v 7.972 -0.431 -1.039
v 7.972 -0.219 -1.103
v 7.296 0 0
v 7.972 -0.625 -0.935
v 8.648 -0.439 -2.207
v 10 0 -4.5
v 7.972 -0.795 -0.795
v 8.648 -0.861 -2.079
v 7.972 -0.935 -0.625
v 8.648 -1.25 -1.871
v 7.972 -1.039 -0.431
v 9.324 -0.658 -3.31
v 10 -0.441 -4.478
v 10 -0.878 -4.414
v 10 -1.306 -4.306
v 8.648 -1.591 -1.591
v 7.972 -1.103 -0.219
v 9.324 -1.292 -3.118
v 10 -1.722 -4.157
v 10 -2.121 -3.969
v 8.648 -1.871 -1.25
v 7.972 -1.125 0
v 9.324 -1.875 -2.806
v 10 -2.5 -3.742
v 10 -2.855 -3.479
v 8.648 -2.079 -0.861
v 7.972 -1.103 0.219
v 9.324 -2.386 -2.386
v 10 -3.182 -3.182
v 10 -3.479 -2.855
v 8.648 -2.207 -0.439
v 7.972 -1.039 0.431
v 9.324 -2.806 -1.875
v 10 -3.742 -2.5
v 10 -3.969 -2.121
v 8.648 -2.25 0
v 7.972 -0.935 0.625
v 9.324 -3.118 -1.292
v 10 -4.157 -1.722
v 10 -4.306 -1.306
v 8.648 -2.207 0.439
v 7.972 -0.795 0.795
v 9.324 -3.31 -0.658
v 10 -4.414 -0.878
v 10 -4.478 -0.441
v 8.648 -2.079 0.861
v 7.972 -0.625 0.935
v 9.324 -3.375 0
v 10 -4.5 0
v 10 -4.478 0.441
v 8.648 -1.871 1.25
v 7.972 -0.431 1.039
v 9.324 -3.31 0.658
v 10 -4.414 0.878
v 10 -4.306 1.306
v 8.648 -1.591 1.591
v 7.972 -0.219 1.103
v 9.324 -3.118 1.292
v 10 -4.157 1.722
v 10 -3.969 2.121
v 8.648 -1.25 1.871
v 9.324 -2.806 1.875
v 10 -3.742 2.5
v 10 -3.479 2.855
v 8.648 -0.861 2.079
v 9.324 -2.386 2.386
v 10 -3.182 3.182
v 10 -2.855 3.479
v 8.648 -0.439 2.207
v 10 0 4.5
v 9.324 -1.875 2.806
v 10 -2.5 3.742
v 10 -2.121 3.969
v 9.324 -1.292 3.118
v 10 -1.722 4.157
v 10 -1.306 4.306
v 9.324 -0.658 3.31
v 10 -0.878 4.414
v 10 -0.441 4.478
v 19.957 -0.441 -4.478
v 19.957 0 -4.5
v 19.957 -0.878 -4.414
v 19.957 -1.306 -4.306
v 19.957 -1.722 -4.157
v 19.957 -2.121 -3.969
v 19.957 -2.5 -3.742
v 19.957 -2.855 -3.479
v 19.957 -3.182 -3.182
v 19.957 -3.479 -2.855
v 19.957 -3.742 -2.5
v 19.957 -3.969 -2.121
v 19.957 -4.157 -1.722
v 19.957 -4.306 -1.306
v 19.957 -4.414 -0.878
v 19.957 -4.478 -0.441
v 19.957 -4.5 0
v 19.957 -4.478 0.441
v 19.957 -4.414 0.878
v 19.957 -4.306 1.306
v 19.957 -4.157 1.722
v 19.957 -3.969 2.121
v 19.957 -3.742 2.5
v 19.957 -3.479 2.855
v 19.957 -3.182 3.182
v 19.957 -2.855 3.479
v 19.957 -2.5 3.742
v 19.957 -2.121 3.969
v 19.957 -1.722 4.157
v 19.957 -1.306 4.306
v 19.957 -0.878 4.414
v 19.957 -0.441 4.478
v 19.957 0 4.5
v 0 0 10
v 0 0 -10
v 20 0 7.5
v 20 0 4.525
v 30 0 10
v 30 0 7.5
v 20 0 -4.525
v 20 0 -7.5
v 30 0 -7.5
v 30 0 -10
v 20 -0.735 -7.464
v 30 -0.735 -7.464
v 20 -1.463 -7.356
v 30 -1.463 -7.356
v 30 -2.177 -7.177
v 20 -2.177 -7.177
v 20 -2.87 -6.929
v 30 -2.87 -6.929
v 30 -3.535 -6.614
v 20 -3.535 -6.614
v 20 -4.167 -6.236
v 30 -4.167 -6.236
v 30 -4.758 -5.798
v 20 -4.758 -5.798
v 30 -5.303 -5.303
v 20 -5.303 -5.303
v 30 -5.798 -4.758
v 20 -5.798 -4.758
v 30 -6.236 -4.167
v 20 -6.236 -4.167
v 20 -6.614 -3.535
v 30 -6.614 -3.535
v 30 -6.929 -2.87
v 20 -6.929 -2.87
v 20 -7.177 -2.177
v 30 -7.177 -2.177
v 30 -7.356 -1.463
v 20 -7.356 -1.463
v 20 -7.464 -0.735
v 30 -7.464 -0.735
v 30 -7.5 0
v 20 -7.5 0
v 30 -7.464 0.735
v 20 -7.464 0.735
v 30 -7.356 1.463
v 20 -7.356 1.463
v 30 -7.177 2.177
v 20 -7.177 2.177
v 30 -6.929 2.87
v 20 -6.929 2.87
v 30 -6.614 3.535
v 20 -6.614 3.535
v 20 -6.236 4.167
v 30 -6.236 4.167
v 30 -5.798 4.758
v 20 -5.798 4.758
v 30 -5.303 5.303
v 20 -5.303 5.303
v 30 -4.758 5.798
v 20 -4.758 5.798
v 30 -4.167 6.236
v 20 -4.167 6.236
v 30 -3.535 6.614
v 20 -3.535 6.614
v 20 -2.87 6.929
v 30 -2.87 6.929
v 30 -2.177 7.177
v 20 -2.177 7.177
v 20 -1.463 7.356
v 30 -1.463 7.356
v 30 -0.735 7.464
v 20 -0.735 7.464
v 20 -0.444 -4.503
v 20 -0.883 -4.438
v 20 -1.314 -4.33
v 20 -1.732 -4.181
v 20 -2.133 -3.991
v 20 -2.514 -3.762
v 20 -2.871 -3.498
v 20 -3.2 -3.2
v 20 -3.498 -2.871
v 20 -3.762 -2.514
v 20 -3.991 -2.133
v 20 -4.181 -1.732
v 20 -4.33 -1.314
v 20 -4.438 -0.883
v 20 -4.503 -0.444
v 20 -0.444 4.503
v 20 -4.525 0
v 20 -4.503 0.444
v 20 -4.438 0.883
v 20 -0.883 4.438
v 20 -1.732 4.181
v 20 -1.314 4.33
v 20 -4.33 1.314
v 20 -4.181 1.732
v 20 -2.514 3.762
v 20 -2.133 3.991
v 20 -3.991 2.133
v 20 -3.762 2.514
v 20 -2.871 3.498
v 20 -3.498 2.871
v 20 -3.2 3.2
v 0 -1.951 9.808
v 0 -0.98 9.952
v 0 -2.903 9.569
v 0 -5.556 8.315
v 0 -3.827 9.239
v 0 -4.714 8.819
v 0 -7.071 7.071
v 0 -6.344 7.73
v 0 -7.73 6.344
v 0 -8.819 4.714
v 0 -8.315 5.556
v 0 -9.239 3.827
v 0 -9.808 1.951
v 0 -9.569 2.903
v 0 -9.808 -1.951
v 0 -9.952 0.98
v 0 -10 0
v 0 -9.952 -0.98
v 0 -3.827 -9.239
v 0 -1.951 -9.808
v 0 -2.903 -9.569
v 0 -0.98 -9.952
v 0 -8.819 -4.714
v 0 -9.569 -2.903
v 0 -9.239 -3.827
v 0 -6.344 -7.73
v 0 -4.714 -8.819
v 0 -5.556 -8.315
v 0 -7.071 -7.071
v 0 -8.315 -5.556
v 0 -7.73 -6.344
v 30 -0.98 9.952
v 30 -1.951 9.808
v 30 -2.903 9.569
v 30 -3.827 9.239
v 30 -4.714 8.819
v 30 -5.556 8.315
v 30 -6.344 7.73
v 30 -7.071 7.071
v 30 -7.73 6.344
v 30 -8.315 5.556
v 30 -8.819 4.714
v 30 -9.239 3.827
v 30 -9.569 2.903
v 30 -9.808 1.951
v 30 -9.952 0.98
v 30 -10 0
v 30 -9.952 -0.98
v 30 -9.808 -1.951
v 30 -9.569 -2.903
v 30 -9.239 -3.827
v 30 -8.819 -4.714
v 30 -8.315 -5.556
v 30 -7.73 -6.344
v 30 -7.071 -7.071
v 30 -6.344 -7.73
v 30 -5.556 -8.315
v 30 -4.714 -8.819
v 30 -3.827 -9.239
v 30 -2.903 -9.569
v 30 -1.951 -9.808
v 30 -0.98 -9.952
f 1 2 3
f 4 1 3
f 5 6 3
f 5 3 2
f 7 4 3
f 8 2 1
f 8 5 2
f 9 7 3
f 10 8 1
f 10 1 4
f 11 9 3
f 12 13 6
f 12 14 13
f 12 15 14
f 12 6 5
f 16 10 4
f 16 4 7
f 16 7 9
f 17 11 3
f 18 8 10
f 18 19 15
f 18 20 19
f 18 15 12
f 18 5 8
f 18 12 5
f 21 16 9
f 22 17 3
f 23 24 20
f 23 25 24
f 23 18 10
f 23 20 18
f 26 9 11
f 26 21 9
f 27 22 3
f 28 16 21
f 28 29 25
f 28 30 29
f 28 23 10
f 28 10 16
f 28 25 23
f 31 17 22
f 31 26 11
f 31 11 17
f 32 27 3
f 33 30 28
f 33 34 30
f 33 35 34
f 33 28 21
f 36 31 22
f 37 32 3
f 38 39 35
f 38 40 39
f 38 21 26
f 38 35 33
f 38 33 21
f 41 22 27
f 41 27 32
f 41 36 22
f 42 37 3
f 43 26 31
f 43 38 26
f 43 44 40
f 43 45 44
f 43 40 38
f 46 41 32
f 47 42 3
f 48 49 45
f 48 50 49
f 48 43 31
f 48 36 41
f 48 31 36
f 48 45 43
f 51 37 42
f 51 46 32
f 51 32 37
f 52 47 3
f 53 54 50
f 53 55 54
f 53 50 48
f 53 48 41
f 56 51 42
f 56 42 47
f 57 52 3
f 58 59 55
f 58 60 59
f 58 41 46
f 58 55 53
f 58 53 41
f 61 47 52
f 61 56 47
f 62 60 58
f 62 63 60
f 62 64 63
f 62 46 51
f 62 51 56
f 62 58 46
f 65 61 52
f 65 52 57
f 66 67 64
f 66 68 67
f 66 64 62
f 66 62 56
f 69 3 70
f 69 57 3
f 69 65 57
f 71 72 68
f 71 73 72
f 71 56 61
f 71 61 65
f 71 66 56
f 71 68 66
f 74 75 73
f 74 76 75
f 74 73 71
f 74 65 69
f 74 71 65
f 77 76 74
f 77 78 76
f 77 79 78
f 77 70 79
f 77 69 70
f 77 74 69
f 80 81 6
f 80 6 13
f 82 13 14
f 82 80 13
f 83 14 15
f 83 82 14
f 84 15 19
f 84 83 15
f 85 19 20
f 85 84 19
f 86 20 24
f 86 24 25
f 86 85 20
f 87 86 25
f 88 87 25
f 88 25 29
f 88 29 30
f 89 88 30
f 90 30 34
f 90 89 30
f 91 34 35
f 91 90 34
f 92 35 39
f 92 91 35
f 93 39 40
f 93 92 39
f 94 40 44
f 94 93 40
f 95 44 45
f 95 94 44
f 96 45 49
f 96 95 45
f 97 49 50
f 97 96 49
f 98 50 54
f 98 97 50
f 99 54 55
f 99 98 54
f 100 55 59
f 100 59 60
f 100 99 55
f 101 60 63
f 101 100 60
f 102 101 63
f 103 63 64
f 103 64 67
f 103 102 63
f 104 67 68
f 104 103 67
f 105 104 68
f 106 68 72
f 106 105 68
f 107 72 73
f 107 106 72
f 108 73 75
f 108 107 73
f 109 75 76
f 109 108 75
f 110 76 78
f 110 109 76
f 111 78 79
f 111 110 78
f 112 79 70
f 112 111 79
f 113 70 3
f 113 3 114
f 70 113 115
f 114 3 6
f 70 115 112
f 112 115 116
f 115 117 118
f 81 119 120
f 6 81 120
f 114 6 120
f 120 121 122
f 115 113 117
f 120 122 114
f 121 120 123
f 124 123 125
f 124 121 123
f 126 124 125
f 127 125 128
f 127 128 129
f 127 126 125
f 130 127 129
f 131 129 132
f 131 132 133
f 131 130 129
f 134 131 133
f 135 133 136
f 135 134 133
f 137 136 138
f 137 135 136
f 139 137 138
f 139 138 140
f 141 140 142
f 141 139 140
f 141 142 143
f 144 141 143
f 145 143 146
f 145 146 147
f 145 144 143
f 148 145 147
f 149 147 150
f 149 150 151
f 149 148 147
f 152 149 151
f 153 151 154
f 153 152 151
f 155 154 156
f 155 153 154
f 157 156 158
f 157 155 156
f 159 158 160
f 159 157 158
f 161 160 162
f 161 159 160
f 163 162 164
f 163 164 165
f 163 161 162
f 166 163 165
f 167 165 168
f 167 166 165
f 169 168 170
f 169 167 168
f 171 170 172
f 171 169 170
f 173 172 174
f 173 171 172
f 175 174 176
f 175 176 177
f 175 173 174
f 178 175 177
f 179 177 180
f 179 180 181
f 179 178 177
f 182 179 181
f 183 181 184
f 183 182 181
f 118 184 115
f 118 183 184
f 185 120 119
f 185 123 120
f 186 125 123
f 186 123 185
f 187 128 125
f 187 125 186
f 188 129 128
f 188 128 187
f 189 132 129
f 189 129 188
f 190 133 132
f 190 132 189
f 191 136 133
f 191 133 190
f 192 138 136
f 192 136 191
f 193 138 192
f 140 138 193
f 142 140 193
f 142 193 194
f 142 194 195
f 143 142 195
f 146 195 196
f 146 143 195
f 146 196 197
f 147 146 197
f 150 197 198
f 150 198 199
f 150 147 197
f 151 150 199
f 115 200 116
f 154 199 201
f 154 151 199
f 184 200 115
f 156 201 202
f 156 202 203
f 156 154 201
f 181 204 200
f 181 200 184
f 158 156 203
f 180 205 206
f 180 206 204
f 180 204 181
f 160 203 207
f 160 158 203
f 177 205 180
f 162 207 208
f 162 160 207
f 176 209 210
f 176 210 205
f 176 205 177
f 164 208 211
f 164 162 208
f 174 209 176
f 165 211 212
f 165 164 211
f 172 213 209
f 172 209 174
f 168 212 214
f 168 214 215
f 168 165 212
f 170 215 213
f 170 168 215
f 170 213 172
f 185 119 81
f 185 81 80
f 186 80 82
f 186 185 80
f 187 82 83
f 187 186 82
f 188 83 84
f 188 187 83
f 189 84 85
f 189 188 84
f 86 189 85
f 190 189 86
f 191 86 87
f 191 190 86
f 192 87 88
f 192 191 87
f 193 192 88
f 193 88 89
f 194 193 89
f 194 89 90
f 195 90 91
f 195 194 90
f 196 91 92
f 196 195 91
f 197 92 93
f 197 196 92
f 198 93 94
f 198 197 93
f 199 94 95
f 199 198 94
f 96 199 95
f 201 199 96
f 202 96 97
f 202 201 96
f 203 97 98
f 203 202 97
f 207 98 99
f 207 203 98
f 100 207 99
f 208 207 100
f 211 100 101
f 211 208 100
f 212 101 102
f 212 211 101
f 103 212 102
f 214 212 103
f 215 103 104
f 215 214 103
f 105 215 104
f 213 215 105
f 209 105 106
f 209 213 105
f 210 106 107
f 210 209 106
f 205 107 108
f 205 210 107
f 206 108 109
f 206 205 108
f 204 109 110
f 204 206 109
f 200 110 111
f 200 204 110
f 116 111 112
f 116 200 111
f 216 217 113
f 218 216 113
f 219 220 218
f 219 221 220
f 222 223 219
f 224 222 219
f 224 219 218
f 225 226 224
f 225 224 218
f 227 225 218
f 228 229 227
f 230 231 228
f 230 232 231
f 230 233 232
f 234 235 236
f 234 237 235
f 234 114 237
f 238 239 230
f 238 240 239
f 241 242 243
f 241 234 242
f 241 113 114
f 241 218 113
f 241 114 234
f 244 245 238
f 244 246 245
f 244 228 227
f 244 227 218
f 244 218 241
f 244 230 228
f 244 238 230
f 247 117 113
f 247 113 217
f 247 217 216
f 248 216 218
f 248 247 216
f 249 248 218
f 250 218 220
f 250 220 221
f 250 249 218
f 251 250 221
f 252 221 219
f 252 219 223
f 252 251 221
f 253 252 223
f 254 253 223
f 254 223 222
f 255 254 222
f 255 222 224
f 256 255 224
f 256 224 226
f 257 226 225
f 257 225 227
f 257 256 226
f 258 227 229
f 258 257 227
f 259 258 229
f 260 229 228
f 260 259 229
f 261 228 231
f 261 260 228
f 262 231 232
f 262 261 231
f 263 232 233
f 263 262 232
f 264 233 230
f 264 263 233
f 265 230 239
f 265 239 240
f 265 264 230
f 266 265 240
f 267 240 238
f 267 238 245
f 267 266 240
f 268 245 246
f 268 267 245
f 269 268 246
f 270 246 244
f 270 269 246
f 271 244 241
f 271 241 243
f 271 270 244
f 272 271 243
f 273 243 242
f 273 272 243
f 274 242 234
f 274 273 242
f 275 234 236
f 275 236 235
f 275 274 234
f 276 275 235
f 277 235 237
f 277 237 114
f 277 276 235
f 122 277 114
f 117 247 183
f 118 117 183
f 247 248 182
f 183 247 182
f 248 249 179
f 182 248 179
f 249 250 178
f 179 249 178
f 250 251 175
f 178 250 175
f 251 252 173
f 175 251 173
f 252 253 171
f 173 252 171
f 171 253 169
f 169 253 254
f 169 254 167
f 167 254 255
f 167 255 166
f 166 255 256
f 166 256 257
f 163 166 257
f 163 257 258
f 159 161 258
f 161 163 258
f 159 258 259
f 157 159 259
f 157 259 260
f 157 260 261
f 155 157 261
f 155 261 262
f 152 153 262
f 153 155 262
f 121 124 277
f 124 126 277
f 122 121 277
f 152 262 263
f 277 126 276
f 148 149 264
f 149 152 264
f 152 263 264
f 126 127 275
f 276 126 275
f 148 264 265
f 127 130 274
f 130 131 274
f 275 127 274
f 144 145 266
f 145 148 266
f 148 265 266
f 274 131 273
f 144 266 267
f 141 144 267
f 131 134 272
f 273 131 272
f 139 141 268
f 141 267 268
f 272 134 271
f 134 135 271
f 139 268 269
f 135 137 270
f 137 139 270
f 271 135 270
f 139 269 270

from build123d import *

# Parameters (mm, degrees)
ESQUISSE1_W             = 30
ESQUISSE1_H             = 10
ESQUISSE3_W             = 32
ESQUISSE3_H             = 12
ENL_V_MAT_EXTRU_1_DEPTH = 34.166247904


with BuildPart() as part:
    # Esquisse1 → Révolution2 (revolve)
    with BuildSketch(Plane.XY, mode=Mode.PRIVATE) as r_volution2_sk:
        with Locations((15, 5)):
            Rectangle(ESQUISSE1_W, ESQUISSE1_H)
    revolve(r_volution2_sk.sketch.rotate(Axis((0, 0, 0), (1, 0, 0)), 90), axis=Axis((0, 0, 0), (1, 0, 0)))

    # Esquisse2 → Chambrage pour vis à tête hexagonale M81 (revolve, cut)
    with BuildSketch(Plane(origin=(30, 0, 0), x_dir=(0, 0, -1), z_dir=(0, 1, 0))):
        Polygon((0, 0), (0, 22.703872786), (4.5, 20), (4.5, 10.04330127), (4.525, 10), (7.5, 10), (7.5, 0), align=None)
    revolve(axis=Axis((36.35, 0, 0), (-1, 0, 0)), mode=Mode.SUBTRACT)

    # Esquisse3 → Enlèv. mat.-Extru.1 (cut, through all)
    with BuildSketch(Plane(origin=(30, 0, 0), x_dir=(0, 0, -1), z_dir=(1, 0, 0))):
        with Locations((-0.50912904, 6)):
            Rectangle(ESQUISSE3_W, ESQUISSE3_H)
    extrude(amount=-ENL_V_MAT_EXTRU_1_DEPTH, mode=Mode.SUBTRACT)


solid = part.part
